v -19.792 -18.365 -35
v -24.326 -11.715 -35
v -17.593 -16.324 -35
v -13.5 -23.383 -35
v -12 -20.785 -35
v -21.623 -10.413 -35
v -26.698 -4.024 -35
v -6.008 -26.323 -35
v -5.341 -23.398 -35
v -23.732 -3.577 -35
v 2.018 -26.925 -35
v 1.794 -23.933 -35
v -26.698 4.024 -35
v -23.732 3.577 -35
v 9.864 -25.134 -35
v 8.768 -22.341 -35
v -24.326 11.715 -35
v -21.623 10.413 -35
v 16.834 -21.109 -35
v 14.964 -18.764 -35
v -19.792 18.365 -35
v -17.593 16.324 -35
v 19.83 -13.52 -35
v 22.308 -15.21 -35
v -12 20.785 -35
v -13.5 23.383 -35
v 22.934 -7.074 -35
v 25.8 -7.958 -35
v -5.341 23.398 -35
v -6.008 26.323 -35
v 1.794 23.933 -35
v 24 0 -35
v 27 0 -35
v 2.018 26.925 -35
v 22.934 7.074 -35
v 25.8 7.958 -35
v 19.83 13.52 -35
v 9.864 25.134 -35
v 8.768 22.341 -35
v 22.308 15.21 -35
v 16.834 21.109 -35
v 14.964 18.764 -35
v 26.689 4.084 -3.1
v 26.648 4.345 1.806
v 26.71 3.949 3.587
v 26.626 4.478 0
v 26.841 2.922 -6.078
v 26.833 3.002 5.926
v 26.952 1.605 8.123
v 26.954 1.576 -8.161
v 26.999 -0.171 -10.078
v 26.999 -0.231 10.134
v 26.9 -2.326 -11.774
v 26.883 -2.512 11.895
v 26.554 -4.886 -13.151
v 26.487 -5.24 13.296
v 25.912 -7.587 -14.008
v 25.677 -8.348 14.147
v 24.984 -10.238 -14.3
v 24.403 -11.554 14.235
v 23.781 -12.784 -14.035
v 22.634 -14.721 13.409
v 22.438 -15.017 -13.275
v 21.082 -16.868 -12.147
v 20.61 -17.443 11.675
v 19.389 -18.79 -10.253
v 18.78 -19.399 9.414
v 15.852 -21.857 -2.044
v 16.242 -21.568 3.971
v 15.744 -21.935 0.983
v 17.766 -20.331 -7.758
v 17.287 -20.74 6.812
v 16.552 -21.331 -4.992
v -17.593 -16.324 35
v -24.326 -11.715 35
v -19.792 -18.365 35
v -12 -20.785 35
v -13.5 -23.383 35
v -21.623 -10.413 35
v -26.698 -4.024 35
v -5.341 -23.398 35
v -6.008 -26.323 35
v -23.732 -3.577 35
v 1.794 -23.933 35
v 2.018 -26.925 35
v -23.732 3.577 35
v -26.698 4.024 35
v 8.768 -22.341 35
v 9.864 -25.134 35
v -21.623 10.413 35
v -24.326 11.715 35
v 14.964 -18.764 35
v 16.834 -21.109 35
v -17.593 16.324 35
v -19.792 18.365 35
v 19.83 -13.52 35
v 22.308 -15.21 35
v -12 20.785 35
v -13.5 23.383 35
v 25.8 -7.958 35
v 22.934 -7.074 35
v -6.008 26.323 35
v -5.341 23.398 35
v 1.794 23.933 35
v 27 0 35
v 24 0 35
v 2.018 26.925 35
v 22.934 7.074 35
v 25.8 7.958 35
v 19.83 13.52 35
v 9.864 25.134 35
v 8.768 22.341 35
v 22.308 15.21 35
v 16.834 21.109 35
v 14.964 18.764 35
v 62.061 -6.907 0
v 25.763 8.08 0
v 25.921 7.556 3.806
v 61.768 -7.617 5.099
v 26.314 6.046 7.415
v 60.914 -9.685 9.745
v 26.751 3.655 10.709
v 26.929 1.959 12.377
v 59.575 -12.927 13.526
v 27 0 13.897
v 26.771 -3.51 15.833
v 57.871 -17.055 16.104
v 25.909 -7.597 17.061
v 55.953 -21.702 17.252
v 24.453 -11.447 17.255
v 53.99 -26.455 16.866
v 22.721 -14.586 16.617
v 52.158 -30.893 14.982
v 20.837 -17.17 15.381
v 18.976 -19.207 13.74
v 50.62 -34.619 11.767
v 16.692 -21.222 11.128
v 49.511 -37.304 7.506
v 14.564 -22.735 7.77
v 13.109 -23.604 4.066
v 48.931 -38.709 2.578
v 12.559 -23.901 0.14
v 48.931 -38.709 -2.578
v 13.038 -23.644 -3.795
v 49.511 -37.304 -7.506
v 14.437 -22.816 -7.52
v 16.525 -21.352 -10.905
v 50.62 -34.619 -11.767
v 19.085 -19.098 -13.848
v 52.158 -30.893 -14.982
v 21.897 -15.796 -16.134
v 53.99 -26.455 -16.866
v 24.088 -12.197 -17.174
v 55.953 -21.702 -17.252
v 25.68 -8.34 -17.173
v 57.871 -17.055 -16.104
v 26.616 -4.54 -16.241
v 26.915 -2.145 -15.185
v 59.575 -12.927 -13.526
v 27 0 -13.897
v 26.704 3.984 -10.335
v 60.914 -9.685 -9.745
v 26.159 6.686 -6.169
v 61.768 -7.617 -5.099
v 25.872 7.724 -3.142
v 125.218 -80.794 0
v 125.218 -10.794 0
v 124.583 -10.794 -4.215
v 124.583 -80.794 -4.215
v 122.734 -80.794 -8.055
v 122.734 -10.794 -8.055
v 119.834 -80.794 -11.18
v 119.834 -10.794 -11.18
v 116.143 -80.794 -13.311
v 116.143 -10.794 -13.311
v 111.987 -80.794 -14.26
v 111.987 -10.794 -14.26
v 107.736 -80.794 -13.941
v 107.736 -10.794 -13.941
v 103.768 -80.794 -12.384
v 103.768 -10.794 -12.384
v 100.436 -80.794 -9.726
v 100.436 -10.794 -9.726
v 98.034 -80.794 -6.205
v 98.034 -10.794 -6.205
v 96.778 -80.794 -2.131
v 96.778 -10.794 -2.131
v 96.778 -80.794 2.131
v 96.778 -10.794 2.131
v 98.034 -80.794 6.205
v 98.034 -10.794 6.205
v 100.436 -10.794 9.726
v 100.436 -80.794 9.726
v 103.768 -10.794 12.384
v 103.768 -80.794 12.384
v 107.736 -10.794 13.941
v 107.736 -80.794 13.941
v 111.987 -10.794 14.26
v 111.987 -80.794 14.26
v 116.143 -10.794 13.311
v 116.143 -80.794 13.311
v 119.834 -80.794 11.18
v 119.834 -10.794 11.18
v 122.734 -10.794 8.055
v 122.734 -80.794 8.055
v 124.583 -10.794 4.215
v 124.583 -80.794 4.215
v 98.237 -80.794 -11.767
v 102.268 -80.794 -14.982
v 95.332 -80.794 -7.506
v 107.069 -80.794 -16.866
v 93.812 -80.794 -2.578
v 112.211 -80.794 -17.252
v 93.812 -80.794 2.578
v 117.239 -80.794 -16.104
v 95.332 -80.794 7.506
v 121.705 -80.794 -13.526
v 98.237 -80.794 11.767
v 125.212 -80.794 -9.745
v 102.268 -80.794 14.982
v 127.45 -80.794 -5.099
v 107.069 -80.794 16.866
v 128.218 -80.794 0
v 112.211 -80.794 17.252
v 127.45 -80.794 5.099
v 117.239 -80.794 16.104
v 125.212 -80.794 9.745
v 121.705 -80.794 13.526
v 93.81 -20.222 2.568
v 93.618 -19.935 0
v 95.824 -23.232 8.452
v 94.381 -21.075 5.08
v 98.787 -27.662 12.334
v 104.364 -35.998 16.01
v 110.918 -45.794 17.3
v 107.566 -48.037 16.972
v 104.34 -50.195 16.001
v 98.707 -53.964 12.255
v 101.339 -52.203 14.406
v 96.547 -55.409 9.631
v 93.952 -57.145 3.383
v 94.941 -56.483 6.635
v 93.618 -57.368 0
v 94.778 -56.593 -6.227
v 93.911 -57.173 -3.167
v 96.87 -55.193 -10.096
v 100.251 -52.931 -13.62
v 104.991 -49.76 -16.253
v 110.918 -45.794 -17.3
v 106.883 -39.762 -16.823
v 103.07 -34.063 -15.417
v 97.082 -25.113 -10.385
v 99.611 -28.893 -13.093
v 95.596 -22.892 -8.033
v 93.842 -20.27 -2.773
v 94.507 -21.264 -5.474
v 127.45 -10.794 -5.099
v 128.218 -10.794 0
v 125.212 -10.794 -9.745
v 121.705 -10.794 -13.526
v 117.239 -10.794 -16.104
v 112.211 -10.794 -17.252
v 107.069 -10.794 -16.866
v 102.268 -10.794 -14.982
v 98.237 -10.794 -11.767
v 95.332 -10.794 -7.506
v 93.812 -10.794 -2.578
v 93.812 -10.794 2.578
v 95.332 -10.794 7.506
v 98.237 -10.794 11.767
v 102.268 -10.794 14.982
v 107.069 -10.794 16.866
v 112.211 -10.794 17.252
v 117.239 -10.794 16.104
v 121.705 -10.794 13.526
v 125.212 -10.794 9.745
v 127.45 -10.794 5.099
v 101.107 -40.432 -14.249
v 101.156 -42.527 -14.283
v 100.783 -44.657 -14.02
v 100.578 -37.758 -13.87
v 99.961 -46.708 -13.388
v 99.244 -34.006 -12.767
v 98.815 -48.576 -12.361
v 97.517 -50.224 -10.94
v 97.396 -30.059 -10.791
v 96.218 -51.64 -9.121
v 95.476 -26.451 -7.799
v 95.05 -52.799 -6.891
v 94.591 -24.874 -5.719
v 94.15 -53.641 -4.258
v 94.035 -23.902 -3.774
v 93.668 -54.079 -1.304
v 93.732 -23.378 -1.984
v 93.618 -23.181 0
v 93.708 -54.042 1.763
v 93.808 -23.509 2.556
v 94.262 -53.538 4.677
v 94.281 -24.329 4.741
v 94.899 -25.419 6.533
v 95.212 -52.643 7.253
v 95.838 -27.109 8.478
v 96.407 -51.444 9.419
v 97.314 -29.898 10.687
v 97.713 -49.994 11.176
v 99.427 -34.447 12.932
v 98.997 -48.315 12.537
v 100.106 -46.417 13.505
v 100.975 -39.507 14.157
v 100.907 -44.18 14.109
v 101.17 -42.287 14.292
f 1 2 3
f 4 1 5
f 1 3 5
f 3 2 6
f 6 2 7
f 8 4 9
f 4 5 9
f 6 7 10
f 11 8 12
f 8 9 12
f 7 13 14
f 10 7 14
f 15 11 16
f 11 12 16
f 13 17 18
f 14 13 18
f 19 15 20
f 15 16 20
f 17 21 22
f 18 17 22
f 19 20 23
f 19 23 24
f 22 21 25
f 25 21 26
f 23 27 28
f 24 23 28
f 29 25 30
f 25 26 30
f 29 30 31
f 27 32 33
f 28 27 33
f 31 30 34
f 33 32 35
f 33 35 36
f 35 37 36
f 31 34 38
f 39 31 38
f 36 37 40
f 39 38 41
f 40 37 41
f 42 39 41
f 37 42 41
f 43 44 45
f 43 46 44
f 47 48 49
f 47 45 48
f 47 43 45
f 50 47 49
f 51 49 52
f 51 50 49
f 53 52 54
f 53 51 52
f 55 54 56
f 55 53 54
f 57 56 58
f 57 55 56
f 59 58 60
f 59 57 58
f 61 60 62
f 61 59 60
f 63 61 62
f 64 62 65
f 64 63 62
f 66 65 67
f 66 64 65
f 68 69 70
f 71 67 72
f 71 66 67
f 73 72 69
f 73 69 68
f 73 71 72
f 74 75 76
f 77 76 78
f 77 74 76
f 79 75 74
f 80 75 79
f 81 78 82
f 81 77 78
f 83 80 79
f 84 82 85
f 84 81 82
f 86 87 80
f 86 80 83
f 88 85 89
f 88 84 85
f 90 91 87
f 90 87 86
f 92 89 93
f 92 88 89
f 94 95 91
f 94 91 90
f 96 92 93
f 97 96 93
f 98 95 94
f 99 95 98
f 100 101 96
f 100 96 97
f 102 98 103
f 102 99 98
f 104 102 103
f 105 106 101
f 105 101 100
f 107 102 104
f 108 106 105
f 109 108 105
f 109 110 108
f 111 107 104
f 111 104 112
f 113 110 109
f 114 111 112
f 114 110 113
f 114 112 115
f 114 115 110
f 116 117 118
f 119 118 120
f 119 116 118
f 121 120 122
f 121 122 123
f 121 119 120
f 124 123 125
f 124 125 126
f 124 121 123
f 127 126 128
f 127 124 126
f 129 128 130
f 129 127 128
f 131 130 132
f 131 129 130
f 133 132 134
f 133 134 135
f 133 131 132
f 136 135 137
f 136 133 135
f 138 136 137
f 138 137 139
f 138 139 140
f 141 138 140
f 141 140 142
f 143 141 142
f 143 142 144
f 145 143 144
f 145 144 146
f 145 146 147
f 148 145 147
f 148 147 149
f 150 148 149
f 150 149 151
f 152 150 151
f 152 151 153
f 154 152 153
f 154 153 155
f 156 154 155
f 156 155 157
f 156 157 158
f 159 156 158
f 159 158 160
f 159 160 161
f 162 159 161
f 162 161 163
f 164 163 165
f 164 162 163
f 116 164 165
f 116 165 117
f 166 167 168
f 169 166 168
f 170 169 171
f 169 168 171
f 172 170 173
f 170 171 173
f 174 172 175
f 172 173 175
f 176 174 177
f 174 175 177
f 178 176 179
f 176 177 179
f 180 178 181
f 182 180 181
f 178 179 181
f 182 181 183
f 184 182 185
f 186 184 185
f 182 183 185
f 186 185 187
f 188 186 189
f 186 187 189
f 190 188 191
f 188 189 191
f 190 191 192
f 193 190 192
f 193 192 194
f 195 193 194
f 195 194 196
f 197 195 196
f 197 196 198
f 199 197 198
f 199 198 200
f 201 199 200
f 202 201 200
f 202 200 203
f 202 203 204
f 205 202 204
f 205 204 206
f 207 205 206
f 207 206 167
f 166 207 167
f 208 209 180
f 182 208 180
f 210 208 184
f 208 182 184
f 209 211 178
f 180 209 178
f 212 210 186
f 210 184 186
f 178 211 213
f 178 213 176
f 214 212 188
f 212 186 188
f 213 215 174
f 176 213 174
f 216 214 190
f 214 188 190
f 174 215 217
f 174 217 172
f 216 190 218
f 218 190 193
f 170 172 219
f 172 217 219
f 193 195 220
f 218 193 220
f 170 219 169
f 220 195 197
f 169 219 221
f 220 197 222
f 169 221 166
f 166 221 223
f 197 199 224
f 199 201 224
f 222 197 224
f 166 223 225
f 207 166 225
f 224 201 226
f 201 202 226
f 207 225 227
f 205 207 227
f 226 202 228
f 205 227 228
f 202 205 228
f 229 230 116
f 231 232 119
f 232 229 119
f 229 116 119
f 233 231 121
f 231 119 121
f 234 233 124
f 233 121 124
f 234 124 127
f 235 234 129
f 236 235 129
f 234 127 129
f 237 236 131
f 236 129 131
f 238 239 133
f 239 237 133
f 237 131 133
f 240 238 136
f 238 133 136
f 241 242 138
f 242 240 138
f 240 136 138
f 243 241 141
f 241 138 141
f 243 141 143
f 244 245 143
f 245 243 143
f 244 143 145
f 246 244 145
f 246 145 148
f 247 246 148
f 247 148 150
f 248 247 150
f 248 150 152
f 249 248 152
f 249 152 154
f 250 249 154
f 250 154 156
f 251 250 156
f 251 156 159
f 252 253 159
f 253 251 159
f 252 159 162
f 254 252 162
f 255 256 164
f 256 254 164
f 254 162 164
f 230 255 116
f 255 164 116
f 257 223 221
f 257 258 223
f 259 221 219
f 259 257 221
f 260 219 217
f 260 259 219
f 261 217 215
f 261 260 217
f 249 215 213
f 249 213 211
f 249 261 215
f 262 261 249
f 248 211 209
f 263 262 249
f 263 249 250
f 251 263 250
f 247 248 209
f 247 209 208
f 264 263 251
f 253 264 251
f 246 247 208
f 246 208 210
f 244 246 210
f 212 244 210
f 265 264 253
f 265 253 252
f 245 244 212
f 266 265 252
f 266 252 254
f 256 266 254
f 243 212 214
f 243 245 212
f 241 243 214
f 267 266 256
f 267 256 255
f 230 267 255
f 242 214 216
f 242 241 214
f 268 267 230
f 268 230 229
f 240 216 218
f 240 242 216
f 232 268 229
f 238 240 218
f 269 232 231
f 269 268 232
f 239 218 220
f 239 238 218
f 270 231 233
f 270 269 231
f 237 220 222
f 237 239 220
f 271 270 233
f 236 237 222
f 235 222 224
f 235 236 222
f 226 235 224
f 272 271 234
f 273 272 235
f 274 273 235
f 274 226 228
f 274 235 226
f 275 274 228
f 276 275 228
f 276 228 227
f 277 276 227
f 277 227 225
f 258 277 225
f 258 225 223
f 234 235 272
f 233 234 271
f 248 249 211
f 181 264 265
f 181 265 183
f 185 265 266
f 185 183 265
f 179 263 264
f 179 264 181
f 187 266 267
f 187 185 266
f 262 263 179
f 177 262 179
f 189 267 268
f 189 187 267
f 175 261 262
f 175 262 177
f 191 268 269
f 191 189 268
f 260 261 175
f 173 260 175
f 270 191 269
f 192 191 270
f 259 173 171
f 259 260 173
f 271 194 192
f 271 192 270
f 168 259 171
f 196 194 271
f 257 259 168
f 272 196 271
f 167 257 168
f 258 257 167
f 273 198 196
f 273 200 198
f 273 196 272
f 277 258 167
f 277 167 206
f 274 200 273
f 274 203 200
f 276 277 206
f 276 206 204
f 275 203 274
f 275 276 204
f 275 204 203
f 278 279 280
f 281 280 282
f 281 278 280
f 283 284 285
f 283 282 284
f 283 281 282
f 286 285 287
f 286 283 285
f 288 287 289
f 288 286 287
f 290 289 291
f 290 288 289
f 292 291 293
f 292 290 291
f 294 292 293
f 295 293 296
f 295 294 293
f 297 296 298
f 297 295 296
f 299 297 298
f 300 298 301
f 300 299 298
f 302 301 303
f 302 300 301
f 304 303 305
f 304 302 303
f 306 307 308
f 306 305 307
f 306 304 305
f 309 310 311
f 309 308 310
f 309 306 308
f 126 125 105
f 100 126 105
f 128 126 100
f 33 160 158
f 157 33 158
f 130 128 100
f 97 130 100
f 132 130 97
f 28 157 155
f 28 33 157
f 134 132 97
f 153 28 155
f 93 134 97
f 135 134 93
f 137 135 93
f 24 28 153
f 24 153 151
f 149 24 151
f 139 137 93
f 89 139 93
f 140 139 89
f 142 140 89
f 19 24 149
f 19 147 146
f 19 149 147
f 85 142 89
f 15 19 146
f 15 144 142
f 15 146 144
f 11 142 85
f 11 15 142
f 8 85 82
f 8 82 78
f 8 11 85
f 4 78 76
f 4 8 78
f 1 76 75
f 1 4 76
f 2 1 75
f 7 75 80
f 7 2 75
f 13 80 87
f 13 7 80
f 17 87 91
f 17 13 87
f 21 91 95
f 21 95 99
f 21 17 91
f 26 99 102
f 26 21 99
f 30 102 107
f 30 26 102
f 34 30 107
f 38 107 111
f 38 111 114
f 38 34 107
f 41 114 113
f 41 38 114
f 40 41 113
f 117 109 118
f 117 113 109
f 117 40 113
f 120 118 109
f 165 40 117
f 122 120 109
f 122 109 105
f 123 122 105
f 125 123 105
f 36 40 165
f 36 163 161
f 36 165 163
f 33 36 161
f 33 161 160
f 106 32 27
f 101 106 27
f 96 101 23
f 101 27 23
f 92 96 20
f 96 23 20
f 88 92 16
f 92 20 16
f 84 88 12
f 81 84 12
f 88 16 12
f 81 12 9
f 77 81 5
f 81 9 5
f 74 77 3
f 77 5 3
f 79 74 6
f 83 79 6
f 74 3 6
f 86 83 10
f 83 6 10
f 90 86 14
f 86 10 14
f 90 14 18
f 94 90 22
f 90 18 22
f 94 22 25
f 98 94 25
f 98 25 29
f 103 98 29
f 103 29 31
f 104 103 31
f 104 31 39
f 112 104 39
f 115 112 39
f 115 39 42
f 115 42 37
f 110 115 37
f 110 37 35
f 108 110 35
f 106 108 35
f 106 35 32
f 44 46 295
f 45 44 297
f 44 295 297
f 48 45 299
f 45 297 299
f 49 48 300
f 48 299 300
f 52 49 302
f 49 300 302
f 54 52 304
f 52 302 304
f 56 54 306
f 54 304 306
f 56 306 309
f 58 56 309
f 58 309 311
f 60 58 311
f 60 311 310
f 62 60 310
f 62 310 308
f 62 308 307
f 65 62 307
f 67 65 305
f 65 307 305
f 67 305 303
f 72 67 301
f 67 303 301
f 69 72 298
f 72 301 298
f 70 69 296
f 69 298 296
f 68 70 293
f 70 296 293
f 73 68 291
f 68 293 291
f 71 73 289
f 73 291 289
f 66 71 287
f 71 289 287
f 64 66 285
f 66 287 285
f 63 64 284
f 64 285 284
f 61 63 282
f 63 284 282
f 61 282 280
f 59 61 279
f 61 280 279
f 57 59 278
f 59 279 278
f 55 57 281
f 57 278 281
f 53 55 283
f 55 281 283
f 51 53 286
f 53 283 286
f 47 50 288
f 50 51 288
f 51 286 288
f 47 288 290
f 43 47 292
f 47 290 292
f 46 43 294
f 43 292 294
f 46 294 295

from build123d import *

# Parameters (mm, degrees)
ESQUISSE1_R                         = 27
ESQUISSE1_R_2                       = 24
ESQUISSE5_R                         = 17.3
ESQUISSE5_R_2                       = 14.3
BOSS_EXTRU_1_REACH                  = 108.661
BOSS_EXTRU_1_END_RADIUS             = 17.3
ESQUISSE8_R                         = 17.3
ESQUISSE8_R_2                       = 14.3
BOSS_EXTRU_1_DIRECTION_2_REACH      = 108.661
BOSS_EXTRU_1_DIRECTION_2_END_RADIUS = 27


with BuildPart() as part:
    # Balayage1: sweep along a path in Esquisse2
    with BuildLine(Plane(origin=(0, 0, 0), x_dir=(0, 0, -1), z_dir=(1, 0, 0))) as balayage1_path:
        Line((-35, 0), (35, 0))
    # Esquisse1 → Balayage1 (sweep)
    with BuildSketch(Plane.XY):
        Circle(ESQUISSE1_R)
        Circle(ESQUISSE1_R_2, mode=Mode.SUBTRACT)
    sweep(path=balayage1_path.line)



with BuildPart() as body_2:
    # Balayage2: sweep along a path in Esquisse6
    with BuildLine(Plane.XY) as balayage2_path:
        Line((110.918298302, -80.794444006), (110.918298302, -10.794444006))
    # Esquisse5 → Balayage2 (sweep)
    with BuildSketch(Plane(origin=(0, -45.794444006, 0), x_dir=(1, 0, 0), z_dir=(0, 1, 0))):
        with Locations((110.918298302, 0)):
            Circle(ESQUISSE5_R)
        with Locations((110.918298302, 0)):
            Circle(ESQUISSE5_R_2, mode=Mode.SUBTRACT)
    sweep(path=balayage2_path.line)


with BuildPart() as part_1:
    add(part.part)

    add(body_2.part)  # Boss.-Extru.1 merges body 2
    # Boss.-Extru.1: up to this cylinder (the profile starts outside it)
    boss_extru_1_end = Plane(origin=(110.918298302, -38.435657, 0), z_dir=(0, -1, 0)) * Cylinder(BOSS_EXTRU_1_END_RADIUS, 252.922, mode=Mode.PRIVATE)
    # Esquisse8 → Boss.-Extru.1 (add, up to the surface)
    with BuildSketch(Plane(origin=(55.459149151, -22.897222003, 0), x_dir=(0, 0, -1), z_dir=(0.9243191525163077, -0.381620366714795, 0)), mode=Mode.PRIVATE) as boss_extru_1_sk1:
        with Locations(Location((0, 0, 0), (0, 0, 90))):
            Circle(ESQUISSE8_R)
        with Locations(Location((0, 0, 0), (0, 0, 90))):
            Circle(ESQUISSE8_R_2, mode=Mode.SUBTRACT)
    boss_extru_1_tool1 = extrude(boss_extru_1_sk1.sketch, amount=BOSS_EXTRU_1_REACH, mode=Mode.PRIVATE) - boss_extru_1_end
    add(boss_extru_1_tool1.solids().sort_by_distance((49.04385, -38.435657, 0))[0])

    # Boss.-Extru.1 direction 2: up to this cylinder (the profile starts outside it)
    boss_extru_1_direction_2_end = Plane(origin=(0, 0, 0), z_dir=(0, 0, 1)) * Cylinder(BOSS_EXTRU_1_DIRECTION_2_END_RADIUS, 272.322, mode=Mode.PRIVATE)
    # Esquisse8 → Boss.-Extru.1 direction 2 (add, up to the surface)
    with BuildSketch(Plane(origin=(55.459149151, -22.897222003, 0), x_dir=(0, 0, -1), z_dir=(0.9243191525163077, -0.381620366714795, 0)), mode=Mode.PRIVATE) as boss_extru_1_direction_2_sk1:
        with Locations(Location((0, 0, 0), (0, 0, 90))):
            Circle(ESQUISSE8_R)
        with Locations(Location((0, 0, 0), (0, 0, 90))):
            Circle(ESQUISSE8_R_2, mode=Mode.SUBTRACT)
    boss_extru_1_direction_2_tool1 = extrude(boss_extru_1_direction_2_sk1.sketch, amount=-BOSS_EXTRU_1_DIRECTION_2_REACH, mode=Mode.PRIVATE) - boss_extru_1_direction_2_end
    add(boss_extru_1_direction_2_tool1.solids().sort_by_distance((49.04385, -38.435657, 0))[0])


solid = part_1.part
